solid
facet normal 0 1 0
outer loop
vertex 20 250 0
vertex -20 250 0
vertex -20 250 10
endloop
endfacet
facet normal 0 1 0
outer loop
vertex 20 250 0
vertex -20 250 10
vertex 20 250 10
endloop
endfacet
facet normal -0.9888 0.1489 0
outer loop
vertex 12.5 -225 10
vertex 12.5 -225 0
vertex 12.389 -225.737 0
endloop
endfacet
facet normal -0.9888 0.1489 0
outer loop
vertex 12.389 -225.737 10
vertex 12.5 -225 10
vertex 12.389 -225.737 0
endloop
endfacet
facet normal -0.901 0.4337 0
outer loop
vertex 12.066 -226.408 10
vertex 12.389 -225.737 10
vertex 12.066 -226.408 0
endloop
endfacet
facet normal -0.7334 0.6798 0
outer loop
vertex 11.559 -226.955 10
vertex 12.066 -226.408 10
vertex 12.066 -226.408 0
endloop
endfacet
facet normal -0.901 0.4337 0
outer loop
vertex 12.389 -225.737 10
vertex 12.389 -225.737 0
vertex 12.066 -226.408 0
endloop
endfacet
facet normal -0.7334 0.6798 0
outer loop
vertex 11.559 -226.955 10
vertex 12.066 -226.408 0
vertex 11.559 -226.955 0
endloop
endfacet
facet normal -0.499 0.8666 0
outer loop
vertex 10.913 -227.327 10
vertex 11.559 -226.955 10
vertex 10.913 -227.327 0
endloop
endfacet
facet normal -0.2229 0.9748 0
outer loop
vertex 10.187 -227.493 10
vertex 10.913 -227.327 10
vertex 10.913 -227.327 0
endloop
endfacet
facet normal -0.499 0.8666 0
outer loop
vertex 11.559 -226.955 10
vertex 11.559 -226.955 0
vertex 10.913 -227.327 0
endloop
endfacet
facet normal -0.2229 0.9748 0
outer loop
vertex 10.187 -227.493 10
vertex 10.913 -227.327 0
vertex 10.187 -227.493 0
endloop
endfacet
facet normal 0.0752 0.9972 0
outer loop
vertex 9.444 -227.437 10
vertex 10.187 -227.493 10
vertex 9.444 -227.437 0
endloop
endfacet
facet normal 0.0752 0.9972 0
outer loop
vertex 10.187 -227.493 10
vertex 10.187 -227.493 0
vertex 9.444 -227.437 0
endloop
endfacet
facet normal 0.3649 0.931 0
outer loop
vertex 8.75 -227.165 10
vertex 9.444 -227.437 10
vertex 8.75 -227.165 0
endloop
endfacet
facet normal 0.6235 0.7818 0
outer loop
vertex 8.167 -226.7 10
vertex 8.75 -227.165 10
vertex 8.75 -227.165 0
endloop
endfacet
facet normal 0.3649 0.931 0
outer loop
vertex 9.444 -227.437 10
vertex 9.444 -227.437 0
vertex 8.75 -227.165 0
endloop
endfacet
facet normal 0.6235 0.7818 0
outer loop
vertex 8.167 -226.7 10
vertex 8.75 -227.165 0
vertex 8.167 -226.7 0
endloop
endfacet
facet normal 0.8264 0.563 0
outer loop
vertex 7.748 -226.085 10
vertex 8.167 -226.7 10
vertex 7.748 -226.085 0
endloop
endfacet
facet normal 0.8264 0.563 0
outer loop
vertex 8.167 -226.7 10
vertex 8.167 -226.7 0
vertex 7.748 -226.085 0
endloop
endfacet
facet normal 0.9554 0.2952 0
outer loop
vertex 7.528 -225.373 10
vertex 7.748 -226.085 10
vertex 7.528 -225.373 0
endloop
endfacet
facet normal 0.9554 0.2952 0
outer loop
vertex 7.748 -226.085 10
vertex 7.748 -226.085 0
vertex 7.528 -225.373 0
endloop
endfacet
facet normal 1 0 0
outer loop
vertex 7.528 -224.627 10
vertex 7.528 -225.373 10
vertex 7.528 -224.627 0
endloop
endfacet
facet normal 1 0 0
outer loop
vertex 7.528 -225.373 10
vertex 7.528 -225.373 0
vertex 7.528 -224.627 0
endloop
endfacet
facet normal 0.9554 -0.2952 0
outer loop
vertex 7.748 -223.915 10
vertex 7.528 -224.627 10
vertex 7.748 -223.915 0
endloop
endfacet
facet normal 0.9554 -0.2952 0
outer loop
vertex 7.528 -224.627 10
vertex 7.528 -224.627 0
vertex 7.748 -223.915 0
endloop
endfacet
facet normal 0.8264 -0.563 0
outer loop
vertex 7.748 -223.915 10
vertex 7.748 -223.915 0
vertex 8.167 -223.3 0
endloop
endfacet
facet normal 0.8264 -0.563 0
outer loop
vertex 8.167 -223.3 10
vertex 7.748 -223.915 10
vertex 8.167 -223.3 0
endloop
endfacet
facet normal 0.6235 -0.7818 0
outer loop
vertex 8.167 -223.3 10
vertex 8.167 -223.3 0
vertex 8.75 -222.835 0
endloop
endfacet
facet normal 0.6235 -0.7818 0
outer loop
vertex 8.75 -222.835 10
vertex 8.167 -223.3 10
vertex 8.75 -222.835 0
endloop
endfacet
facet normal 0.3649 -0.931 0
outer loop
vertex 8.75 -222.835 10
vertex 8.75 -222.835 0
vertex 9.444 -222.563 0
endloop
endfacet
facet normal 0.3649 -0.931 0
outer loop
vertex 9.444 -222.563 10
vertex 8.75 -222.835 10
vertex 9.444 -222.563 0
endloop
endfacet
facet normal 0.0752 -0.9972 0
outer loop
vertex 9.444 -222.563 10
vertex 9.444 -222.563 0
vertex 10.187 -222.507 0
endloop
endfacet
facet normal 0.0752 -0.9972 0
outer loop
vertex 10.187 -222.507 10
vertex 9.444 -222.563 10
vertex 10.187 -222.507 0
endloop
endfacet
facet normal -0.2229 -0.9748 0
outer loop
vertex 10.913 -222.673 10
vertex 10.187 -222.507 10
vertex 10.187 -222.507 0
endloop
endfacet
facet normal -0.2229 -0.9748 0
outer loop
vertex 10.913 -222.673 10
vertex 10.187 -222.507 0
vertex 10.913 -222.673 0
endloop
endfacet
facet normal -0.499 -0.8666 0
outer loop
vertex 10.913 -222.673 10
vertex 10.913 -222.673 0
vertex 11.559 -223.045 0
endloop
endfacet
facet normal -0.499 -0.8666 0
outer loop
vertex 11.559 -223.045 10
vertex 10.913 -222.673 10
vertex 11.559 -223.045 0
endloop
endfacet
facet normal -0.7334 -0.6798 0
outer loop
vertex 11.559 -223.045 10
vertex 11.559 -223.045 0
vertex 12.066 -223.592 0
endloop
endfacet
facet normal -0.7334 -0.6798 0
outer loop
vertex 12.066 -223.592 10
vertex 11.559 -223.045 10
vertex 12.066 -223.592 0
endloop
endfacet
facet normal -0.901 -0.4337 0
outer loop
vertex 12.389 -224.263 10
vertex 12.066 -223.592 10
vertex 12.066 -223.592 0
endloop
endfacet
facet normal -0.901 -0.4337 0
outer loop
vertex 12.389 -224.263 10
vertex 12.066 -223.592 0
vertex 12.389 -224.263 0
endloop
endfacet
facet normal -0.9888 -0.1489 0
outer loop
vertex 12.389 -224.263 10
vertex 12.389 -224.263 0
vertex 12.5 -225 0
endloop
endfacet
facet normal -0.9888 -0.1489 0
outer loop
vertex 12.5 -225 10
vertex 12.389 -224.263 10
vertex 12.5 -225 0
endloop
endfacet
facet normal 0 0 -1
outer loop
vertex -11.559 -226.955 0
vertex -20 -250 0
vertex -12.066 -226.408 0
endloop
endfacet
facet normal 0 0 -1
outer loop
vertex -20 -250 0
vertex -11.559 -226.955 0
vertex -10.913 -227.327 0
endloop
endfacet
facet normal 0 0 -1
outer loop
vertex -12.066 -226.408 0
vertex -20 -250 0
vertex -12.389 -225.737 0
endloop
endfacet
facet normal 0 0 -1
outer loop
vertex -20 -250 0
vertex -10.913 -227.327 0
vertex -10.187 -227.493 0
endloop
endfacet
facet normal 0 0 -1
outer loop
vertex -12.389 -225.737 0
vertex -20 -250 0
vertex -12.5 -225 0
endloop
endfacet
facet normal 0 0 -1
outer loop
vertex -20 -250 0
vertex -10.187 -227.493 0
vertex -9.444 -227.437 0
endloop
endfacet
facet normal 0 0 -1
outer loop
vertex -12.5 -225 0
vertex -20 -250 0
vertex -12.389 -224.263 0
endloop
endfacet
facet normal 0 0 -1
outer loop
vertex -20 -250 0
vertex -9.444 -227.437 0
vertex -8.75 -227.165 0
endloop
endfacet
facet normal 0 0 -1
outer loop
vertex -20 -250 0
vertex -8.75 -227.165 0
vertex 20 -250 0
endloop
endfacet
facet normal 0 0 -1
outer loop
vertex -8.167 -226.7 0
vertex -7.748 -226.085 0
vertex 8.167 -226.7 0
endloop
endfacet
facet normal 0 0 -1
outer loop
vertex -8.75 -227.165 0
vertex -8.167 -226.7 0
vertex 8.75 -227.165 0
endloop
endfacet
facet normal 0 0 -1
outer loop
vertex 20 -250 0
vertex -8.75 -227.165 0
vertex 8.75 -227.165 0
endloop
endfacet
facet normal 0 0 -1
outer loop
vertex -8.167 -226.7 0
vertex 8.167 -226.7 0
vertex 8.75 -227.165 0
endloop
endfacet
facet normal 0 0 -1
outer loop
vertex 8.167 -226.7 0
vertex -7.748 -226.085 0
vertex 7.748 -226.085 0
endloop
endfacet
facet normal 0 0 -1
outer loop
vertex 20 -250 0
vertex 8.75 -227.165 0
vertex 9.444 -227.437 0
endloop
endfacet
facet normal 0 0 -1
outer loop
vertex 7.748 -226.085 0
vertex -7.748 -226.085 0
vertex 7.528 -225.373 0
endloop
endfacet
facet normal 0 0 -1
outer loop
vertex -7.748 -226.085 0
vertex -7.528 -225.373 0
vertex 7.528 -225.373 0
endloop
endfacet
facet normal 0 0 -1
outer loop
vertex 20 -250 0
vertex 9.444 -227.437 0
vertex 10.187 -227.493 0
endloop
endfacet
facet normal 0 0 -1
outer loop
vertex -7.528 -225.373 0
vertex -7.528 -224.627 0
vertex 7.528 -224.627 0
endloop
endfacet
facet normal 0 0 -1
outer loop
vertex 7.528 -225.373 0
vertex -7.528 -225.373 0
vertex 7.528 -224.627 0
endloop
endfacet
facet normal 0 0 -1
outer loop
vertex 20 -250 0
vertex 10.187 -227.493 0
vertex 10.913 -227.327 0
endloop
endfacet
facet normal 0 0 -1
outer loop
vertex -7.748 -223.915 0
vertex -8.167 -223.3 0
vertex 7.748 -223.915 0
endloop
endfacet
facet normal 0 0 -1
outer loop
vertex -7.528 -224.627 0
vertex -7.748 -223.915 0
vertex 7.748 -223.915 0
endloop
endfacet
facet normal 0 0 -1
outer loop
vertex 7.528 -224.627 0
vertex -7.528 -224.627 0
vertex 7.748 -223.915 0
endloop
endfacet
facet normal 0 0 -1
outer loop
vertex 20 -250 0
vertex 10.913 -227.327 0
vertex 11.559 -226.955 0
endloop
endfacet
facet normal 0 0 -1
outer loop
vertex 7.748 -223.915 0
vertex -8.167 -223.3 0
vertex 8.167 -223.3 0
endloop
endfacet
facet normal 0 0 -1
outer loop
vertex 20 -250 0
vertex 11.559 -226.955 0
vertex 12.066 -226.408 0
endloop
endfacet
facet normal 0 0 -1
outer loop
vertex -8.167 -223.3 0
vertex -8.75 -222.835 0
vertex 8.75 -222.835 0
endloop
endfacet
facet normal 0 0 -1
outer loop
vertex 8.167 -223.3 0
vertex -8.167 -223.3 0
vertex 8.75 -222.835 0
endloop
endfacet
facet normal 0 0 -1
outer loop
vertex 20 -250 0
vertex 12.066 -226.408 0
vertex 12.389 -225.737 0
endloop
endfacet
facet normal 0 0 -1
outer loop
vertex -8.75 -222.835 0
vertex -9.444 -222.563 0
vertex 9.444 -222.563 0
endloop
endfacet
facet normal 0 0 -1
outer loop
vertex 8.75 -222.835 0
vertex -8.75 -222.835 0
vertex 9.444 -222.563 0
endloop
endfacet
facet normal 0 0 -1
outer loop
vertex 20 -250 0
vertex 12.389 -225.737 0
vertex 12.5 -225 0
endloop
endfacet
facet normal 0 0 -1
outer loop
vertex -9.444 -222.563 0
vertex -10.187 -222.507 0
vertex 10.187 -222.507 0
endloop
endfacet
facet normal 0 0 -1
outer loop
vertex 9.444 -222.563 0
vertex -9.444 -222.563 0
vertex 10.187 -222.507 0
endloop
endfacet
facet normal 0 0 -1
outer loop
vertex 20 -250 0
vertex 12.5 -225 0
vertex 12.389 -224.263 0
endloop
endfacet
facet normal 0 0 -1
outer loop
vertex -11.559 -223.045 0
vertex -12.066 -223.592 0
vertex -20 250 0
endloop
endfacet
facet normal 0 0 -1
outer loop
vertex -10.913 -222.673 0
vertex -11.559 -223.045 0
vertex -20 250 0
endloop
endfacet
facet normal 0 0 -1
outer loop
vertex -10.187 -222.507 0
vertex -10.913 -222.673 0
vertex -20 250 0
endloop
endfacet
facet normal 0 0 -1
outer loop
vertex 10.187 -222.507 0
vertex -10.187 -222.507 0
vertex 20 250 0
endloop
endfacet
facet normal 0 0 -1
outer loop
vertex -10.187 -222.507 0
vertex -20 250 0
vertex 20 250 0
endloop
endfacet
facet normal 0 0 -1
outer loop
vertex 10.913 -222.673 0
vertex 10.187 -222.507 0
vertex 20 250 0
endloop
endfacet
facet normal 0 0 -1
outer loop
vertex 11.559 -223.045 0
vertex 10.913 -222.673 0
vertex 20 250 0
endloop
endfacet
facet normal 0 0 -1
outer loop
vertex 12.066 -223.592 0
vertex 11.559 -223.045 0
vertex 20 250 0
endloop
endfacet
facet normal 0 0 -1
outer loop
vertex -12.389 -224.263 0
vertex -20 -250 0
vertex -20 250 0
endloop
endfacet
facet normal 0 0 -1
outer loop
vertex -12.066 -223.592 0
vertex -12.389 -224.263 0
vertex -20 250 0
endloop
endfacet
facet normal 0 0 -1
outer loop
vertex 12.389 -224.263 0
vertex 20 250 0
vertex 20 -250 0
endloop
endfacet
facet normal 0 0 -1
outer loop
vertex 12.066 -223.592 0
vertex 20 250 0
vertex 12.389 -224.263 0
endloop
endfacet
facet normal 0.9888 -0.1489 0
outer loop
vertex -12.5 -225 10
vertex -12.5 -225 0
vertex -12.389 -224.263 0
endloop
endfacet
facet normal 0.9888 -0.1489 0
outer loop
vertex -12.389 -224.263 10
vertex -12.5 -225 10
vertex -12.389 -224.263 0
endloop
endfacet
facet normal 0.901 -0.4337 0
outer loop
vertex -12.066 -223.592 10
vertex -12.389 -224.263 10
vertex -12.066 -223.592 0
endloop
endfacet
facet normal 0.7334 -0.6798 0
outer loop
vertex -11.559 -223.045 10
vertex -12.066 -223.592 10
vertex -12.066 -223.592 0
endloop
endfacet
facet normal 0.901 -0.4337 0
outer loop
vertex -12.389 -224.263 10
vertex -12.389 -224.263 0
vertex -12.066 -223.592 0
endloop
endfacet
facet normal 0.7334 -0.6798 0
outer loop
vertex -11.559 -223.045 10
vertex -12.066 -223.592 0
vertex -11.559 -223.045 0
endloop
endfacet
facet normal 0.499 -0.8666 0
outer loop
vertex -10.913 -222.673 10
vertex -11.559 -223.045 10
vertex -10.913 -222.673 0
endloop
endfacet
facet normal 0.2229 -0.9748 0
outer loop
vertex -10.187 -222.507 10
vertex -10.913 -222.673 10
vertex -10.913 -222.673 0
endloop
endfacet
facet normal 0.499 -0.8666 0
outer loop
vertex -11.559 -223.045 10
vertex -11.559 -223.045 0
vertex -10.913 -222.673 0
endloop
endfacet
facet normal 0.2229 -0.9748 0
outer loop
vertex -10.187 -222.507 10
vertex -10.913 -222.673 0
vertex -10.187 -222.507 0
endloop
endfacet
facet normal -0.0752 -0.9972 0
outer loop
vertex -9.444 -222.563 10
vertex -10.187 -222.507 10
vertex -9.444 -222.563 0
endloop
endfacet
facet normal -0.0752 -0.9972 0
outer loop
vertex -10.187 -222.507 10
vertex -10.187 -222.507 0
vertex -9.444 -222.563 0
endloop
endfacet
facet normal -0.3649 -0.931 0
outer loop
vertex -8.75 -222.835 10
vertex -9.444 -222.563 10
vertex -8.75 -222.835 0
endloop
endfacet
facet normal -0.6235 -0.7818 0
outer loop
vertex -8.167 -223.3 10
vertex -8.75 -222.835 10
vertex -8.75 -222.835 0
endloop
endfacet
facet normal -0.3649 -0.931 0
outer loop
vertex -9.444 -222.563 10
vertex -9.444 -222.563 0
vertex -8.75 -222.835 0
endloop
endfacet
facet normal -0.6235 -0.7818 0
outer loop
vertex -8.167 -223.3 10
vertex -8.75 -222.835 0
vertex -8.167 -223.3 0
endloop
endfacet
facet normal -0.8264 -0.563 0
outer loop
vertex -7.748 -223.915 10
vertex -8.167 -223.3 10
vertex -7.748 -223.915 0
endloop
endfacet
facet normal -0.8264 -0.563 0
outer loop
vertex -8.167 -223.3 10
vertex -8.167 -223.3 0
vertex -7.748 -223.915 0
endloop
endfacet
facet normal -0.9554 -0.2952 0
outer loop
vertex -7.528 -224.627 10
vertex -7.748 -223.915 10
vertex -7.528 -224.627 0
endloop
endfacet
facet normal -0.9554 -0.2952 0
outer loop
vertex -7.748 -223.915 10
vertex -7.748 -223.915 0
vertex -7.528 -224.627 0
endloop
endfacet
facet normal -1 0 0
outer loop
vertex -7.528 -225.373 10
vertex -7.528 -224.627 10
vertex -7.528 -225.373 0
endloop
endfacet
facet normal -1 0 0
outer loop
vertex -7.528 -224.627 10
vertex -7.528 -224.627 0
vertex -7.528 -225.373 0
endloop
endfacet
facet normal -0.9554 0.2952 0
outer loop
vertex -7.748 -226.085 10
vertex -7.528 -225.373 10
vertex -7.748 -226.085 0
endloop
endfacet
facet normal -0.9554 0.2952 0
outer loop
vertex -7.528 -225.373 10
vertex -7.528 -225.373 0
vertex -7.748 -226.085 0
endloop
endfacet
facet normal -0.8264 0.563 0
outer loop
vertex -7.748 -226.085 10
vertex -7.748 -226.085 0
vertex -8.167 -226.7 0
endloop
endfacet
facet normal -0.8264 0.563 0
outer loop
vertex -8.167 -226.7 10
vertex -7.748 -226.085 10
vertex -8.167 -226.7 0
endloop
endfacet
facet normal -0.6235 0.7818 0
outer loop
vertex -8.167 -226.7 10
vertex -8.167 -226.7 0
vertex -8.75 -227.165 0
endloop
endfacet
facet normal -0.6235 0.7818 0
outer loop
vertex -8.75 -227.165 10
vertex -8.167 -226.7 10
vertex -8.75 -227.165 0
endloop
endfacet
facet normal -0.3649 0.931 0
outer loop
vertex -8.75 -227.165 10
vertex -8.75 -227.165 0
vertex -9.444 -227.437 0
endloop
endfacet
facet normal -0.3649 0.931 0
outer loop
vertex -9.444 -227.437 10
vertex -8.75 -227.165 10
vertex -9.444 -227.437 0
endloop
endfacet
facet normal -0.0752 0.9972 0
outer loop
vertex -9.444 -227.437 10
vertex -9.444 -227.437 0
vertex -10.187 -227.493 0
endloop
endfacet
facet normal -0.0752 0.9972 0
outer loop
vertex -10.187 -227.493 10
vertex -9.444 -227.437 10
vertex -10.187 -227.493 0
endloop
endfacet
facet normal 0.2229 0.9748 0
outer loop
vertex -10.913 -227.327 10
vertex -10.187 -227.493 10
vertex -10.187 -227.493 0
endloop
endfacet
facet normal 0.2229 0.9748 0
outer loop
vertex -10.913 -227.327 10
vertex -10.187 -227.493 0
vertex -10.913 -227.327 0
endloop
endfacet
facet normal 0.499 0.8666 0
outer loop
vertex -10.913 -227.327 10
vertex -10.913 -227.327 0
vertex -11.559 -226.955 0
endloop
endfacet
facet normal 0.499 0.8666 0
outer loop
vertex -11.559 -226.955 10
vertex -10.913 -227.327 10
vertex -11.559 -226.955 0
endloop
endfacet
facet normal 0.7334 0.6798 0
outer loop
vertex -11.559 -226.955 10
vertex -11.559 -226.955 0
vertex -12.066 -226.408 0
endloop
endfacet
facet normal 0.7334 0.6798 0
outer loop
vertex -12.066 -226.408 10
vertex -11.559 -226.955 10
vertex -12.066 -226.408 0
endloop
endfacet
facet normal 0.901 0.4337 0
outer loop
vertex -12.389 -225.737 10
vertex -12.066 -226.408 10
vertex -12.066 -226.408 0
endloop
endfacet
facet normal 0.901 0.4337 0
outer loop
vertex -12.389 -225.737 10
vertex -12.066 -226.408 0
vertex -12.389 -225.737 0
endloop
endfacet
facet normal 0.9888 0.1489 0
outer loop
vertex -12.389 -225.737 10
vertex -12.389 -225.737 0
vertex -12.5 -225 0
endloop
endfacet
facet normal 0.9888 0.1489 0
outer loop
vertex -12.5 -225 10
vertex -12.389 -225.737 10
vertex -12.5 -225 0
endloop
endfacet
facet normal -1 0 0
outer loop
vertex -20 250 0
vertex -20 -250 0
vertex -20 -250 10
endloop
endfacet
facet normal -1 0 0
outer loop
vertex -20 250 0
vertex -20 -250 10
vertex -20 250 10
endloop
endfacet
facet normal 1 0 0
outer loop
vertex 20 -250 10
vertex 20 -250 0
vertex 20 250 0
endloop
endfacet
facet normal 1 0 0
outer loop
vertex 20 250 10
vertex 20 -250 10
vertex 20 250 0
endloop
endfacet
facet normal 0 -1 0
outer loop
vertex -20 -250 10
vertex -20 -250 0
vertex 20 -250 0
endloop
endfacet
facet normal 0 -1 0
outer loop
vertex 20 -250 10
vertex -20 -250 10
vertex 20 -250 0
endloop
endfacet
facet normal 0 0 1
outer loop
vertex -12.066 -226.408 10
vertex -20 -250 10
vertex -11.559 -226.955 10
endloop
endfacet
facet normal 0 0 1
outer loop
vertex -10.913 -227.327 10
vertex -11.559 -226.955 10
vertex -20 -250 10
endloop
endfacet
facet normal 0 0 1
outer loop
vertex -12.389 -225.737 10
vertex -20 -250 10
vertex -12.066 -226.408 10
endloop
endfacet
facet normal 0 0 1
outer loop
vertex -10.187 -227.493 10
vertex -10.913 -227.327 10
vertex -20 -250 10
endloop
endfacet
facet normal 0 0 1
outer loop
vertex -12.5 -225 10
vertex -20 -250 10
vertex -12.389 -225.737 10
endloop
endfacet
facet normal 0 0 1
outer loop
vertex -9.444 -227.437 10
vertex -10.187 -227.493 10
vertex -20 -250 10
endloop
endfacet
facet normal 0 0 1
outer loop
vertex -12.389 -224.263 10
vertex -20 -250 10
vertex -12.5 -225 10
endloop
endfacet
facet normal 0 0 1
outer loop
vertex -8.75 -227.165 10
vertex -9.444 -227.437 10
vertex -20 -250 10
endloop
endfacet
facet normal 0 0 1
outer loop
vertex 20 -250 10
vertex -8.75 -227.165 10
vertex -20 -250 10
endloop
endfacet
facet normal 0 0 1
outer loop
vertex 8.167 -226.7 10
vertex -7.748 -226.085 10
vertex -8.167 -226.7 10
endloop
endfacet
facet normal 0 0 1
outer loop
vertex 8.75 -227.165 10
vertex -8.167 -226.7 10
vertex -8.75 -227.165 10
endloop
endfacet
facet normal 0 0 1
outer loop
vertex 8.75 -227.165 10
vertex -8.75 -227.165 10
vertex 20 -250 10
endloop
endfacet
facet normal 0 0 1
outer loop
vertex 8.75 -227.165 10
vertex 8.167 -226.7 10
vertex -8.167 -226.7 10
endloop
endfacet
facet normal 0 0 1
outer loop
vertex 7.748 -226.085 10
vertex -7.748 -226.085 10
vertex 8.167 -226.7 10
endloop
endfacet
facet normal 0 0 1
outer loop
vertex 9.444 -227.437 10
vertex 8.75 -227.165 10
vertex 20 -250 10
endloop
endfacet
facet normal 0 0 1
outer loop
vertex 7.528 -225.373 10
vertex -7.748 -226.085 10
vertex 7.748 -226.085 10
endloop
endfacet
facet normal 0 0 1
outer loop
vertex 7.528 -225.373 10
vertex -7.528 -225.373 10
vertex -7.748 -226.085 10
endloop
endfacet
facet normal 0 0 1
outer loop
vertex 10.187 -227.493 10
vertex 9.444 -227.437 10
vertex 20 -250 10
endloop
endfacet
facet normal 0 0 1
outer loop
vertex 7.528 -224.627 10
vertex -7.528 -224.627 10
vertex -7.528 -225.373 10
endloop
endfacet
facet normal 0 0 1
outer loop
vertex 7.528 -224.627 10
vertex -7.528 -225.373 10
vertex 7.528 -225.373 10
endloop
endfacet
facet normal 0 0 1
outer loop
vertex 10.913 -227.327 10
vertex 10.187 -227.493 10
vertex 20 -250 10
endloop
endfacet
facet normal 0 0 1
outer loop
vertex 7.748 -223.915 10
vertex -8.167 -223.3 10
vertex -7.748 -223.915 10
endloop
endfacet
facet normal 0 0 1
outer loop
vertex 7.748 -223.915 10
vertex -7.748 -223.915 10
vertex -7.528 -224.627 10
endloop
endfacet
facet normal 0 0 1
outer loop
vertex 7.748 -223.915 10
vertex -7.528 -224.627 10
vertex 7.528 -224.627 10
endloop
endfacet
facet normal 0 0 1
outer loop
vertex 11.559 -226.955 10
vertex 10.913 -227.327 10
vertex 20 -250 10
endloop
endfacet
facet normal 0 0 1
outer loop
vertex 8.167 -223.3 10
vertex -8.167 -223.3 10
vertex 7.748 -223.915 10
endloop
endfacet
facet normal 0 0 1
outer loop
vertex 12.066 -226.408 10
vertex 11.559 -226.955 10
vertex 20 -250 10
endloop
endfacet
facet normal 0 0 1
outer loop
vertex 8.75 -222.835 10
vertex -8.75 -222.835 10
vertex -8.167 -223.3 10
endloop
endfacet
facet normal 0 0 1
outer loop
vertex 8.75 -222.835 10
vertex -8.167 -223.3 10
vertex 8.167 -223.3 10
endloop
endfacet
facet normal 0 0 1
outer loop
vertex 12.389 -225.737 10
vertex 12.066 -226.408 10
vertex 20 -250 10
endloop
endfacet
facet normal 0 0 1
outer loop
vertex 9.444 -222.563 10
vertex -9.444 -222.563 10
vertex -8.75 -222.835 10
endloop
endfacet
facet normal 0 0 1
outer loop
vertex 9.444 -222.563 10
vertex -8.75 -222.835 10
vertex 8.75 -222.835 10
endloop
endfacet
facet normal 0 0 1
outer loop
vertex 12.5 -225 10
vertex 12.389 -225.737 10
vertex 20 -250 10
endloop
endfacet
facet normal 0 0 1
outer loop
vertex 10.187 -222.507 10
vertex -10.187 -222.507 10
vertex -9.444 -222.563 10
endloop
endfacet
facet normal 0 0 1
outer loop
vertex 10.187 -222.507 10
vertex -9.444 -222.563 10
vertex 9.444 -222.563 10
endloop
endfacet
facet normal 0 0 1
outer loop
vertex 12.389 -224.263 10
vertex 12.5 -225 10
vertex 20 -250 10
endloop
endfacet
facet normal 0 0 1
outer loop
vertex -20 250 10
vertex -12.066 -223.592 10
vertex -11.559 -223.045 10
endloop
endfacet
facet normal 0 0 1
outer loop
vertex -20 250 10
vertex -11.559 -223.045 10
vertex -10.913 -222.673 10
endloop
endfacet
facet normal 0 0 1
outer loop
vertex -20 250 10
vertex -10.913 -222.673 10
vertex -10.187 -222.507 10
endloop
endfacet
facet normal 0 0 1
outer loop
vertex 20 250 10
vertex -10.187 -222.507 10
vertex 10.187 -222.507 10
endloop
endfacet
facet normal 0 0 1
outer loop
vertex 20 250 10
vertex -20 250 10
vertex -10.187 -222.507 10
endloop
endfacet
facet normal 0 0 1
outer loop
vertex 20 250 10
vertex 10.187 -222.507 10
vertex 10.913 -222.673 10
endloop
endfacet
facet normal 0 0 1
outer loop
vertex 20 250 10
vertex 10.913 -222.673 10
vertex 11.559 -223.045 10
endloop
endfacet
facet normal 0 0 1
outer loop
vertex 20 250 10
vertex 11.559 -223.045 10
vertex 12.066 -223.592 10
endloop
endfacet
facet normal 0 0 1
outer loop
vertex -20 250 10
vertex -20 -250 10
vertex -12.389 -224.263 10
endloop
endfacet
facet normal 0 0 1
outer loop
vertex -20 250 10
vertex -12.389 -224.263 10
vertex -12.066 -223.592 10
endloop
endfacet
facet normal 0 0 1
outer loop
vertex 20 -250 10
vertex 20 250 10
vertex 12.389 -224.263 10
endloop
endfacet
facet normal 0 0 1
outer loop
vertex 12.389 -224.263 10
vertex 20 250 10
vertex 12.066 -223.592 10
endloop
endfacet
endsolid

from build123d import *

# Parameters (mm, degrees)
SKETCH1_W           = 40
SKETCH1_H           = 500
BOSS_EXTRUDE1_DEPTH = 10
SKETCH2_R           = 2.5
CUT_EXTRUDE1_DEPTH  = 251.99800796


with BuildPart() as part:
    # Sketch1 → Boss-Extrude1 (new body)
    with BuildSketch(Plane.XY):
        Rectangle(SKETCH1_W, SKETCH1_H)
    extrude(amount=BOSS_EXTRUDE1_DEPTH)

    # Sketch2 → Cut-Extrude1 (cut, through all)
    with BuildSketch(Plane(origin=(0, 0, 0), x_dir=(-1, 0, 0), z_dir=(0, 0, -1))):
        with Locations((10, -225)):
            Circle(SKETCH2_R)
        with Locations(Location((-10, -225, 0), (0, 0, 180))):
            Circle(SKETCH2_R)
    extrude(amount=-CUT_EXTRUDE1_DEPTH, mode=Mode.SUBTRACT)


solid = part.part
